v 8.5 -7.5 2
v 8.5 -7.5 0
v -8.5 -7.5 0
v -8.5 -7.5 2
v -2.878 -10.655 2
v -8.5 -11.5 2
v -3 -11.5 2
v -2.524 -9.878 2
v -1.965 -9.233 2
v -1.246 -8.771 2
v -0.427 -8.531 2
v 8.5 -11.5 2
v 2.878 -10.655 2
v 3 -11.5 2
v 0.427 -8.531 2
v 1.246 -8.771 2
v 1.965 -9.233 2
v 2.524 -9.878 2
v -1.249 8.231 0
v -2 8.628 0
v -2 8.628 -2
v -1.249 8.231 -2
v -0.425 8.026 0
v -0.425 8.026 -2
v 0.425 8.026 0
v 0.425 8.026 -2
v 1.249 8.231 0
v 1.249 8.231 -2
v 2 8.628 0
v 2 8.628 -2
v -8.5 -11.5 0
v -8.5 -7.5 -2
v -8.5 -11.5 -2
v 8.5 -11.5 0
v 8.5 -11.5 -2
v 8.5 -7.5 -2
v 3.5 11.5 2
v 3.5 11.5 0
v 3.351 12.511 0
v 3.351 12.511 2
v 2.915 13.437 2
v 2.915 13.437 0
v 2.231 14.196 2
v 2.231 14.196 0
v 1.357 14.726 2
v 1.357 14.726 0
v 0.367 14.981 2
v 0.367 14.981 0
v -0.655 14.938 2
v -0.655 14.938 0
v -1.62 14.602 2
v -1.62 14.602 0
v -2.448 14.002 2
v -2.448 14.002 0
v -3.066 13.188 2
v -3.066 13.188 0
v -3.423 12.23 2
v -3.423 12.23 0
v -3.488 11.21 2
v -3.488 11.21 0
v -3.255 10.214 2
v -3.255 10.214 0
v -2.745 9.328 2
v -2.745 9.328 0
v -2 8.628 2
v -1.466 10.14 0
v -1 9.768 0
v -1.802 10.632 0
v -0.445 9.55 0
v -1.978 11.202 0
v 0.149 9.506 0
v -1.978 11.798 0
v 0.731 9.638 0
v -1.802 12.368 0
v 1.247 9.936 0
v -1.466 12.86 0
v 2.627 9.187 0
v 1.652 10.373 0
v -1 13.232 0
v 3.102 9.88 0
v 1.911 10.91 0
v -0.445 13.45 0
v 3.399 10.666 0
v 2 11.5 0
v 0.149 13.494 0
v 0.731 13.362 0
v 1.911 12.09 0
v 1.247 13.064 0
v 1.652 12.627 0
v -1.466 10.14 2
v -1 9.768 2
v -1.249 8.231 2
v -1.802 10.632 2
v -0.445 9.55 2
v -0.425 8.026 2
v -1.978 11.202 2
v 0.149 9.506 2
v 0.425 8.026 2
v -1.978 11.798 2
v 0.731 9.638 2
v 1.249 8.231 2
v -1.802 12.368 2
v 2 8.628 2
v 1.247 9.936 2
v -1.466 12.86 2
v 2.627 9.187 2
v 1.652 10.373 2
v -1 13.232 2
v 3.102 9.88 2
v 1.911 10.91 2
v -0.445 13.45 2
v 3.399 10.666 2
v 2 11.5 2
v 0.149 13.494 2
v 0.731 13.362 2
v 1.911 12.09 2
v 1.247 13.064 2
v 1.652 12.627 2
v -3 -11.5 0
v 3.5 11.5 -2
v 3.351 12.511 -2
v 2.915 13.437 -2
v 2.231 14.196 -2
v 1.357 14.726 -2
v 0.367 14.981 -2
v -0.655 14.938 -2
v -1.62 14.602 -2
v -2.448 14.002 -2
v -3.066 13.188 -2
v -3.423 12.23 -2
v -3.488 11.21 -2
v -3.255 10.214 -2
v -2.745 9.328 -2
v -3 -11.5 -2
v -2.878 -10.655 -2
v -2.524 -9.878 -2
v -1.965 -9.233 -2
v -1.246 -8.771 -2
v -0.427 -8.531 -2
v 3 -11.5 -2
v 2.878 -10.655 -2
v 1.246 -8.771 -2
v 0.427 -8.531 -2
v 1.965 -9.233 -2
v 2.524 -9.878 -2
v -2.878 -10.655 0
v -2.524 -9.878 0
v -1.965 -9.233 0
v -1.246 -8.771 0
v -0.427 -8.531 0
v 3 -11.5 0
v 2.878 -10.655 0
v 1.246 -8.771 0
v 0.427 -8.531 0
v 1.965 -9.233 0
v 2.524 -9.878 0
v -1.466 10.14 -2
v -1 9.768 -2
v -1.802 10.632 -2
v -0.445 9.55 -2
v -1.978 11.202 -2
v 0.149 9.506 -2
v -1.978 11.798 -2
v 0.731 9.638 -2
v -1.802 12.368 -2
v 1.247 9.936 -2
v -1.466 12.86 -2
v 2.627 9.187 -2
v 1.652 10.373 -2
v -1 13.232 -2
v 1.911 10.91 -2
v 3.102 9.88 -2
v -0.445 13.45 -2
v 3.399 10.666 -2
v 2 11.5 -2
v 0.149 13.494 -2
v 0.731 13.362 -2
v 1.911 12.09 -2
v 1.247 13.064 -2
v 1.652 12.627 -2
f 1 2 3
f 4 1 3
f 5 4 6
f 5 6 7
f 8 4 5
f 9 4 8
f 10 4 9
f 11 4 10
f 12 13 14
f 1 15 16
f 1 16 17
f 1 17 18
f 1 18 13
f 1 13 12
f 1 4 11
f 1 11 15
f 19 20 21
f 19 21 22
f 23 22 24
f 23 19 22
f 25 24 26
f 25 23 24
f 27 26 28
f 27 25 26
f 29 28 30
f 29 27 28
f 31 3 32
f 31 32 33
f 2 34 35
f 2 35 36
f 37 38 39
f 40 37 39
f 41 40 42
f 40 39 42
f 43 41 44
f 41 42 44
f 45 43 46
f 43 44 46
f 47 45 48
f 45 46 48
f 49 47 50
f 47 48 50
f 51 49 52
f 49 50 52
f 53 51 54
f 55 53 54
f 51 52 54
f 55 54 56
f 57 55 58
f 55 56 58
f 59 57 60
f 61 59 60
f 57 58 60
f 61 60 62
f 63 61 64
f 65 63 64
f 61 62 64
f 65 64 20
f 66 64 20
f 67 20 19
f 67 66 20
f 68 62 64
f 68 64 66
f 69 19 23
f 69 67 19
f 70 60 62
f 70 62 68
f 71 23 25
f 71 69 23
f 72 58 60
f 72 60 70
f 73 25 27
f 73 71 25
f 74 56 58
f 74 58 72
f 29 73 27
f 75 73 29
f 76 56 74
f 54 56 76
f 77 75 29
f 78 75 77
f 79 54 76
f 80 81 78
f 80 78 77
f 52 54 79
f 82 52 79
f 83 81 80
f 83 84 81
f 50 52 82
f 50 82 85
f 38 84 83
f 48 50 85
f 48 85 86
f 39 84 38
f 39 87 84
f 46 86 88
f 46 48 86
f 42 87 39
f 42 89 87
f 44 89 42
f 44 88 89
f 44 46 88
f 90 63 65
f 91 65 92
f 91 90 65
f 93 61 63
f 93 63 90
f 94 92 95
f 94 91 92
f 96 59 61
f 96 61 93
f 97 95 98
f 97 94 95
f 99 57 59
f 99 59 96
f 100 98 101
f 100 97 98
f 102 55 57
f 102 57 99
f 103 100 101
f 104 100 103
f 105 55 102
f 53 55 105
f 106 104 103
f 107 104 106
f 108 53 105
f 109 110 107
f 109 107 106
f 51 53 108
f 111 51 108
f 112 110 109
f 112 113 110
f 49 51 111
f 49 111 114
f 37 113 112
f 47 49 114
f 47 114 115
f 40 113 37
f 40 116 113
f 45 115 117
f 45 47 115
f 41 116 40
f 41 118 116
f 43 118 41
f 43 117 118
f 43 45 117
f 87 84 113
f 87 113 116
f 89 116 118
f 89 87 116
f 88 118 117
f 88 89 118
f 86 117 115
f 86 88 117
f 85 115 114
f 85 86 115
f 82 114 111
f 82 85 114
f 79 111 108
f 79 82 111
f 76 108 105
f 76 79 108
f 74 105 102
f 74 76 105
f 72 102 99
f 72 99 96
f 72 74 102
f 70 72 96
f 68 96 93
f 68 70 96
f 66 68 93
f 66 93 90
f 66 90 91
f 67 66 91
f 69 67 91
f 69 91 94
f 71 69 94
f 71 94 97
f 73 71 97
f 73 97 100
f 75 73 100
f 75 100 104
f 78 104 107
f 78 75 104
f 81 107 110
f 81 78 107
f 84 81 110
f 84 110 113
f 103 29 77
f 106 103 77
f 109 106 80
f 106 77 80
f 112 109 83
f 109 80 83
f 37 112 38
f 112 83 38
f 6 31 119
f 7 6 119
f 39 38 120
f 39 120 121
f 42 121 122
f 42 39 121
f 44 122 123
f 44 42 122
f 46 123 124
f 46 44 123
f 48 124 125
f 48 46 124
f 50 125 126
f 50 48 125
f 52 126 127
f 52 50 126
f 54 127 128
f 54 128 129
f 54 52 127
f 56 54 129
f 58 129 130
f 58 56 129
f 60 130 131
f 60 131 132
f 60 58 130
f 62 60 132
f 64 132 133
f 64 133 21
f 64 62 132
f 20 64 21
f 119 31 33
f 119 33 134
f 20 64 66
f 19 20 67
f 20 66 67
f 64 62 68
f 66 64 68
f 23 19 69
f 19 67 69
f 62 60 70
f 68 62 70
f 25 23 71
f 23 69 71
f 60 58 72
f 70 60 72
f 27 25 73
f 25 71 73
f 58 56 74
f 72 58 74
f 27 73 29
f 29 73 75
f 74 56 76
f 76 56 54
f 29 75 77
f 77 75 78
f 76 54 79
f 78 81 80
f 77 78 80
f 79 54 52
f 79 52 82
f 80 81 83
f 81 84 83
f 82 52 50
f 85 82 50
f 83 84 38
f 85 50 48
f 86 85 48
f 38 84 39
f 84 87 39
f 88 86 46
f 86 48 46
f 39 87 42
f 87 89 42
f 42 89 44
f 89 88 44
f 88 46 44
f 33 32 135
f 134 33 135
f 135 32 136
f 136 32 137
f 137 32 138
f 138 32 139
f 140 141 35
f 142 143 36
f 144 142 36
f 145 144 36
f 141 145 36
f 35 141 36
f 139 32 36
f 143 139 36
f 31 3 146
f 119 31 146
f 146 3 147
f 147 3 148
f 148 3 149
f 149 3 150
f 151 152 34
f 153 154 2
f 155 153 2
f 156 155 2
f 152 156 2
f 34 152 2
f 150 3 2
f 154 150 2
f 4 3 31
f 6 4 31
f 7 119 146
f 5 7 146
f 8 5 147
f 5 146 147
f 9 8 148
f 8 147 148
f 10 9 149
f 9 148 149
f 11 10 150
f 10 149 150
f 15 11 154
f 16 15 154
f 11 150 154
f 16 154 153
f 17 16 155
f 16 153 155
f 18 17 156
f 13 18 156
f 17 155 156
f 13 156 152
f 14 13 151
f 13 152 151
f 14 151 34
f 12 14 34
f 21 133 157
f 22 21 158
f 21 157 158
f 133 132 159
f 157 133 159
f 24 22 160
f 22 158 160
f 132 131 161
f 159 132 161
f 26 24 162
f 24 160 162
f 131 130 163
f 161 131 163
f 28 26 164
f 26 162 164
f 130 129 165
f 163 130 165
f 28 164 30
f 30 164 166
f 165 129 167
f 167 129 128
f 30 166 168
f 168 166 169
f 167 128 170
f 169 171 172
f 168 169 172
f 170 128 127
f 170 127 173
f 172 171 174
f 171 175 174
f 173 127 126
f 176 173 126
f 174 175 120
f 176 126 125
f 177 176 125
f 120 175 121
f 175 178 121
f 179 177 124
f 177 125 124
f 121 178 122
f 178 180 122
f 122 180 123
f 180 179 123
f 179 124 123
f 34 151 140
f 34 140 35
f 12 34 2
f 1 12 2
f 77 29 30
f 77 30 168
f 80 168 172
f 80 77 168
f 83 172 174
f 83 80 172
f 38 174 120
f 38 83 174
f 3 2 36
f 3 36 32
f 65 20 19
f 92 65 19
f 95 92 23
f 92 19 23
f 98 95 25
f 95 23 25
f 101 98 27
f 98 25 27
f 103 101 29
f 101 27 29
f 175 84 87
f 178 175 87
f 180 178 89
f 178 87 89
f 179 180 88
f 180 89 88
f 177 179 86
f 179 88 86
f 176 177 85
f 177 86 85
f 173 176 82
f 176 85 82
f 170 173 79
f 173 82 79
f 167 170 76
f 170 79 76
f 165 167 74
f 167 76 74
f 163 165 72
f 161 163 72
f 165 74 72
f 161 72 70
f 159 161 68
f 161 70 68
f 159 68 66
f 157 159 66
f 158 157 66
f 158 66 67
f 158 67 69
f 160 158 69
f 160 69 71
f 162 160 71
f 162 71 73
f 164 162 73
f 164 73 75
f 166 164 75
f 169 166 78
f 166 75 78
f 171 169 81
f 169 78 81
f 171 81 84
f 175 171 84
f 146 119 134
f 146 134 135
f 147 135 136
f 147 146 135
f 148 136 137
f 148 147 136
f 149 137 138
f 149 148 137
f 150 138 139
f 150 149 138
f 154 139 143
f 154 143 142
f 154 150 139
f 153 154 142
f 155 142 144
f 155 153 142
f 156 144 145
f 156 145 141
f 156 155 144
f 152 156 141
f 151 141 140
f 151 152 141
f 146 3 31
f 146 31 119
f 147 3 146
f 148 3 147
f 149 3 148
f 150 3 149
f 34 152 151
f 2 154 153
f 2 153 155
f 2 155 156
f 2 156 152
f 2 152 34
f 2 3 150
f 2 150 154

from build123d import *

# Parameters (mm, degrees)
F0_R     = 2
F2_DEPTH = 2


with BuildPart() as f2:
    # F0 (on Top) → F2 (new body)
    with BuildSketch(Plane.XY):
        with BuildLine():
            ThreePointArc((-2, 8.627719), (0, 8), (2, 8.627719))
            ThreePointArc((2, 8.627719), (3.102418, 9.879815), (3.5, 11.5))
            ThreePointArc((3.5, 11.5), (-1.620185, 14.602418), (-2, 8.627719))
        make_face()
        with Locations((0, 11.5)):
            Circle(F0_R, mode=Mode.SUBTRACT)
        with BuildLine():
            ThreePointArc((-3, -11.5), (0, -8.5), (3, -11.5))
            Line((3, -11.5), (4.5, -11.5))
            Line((4.5, -11.5), (8.5, -11.5))
            Line((8.5, -11.5), (8.5, -7.5))
            Line((8.5, -7.5), (-8.5, -7.5))
            Line((-8.5, -7.5), (-8.5, -11.5))
            Line((-8.5, -11.5), (-4.5, -11.5))
            Line((-4.5, -11.5), (-3, -11.5))
        make_face()
    extrude(amount=F2_DEPTH)


with BuildPart() as f5_1:
    # F5: instance of F2
    add(f2.part.mirror(Plane.XY))


solid = Compound([f2.part, f5_1.part])
